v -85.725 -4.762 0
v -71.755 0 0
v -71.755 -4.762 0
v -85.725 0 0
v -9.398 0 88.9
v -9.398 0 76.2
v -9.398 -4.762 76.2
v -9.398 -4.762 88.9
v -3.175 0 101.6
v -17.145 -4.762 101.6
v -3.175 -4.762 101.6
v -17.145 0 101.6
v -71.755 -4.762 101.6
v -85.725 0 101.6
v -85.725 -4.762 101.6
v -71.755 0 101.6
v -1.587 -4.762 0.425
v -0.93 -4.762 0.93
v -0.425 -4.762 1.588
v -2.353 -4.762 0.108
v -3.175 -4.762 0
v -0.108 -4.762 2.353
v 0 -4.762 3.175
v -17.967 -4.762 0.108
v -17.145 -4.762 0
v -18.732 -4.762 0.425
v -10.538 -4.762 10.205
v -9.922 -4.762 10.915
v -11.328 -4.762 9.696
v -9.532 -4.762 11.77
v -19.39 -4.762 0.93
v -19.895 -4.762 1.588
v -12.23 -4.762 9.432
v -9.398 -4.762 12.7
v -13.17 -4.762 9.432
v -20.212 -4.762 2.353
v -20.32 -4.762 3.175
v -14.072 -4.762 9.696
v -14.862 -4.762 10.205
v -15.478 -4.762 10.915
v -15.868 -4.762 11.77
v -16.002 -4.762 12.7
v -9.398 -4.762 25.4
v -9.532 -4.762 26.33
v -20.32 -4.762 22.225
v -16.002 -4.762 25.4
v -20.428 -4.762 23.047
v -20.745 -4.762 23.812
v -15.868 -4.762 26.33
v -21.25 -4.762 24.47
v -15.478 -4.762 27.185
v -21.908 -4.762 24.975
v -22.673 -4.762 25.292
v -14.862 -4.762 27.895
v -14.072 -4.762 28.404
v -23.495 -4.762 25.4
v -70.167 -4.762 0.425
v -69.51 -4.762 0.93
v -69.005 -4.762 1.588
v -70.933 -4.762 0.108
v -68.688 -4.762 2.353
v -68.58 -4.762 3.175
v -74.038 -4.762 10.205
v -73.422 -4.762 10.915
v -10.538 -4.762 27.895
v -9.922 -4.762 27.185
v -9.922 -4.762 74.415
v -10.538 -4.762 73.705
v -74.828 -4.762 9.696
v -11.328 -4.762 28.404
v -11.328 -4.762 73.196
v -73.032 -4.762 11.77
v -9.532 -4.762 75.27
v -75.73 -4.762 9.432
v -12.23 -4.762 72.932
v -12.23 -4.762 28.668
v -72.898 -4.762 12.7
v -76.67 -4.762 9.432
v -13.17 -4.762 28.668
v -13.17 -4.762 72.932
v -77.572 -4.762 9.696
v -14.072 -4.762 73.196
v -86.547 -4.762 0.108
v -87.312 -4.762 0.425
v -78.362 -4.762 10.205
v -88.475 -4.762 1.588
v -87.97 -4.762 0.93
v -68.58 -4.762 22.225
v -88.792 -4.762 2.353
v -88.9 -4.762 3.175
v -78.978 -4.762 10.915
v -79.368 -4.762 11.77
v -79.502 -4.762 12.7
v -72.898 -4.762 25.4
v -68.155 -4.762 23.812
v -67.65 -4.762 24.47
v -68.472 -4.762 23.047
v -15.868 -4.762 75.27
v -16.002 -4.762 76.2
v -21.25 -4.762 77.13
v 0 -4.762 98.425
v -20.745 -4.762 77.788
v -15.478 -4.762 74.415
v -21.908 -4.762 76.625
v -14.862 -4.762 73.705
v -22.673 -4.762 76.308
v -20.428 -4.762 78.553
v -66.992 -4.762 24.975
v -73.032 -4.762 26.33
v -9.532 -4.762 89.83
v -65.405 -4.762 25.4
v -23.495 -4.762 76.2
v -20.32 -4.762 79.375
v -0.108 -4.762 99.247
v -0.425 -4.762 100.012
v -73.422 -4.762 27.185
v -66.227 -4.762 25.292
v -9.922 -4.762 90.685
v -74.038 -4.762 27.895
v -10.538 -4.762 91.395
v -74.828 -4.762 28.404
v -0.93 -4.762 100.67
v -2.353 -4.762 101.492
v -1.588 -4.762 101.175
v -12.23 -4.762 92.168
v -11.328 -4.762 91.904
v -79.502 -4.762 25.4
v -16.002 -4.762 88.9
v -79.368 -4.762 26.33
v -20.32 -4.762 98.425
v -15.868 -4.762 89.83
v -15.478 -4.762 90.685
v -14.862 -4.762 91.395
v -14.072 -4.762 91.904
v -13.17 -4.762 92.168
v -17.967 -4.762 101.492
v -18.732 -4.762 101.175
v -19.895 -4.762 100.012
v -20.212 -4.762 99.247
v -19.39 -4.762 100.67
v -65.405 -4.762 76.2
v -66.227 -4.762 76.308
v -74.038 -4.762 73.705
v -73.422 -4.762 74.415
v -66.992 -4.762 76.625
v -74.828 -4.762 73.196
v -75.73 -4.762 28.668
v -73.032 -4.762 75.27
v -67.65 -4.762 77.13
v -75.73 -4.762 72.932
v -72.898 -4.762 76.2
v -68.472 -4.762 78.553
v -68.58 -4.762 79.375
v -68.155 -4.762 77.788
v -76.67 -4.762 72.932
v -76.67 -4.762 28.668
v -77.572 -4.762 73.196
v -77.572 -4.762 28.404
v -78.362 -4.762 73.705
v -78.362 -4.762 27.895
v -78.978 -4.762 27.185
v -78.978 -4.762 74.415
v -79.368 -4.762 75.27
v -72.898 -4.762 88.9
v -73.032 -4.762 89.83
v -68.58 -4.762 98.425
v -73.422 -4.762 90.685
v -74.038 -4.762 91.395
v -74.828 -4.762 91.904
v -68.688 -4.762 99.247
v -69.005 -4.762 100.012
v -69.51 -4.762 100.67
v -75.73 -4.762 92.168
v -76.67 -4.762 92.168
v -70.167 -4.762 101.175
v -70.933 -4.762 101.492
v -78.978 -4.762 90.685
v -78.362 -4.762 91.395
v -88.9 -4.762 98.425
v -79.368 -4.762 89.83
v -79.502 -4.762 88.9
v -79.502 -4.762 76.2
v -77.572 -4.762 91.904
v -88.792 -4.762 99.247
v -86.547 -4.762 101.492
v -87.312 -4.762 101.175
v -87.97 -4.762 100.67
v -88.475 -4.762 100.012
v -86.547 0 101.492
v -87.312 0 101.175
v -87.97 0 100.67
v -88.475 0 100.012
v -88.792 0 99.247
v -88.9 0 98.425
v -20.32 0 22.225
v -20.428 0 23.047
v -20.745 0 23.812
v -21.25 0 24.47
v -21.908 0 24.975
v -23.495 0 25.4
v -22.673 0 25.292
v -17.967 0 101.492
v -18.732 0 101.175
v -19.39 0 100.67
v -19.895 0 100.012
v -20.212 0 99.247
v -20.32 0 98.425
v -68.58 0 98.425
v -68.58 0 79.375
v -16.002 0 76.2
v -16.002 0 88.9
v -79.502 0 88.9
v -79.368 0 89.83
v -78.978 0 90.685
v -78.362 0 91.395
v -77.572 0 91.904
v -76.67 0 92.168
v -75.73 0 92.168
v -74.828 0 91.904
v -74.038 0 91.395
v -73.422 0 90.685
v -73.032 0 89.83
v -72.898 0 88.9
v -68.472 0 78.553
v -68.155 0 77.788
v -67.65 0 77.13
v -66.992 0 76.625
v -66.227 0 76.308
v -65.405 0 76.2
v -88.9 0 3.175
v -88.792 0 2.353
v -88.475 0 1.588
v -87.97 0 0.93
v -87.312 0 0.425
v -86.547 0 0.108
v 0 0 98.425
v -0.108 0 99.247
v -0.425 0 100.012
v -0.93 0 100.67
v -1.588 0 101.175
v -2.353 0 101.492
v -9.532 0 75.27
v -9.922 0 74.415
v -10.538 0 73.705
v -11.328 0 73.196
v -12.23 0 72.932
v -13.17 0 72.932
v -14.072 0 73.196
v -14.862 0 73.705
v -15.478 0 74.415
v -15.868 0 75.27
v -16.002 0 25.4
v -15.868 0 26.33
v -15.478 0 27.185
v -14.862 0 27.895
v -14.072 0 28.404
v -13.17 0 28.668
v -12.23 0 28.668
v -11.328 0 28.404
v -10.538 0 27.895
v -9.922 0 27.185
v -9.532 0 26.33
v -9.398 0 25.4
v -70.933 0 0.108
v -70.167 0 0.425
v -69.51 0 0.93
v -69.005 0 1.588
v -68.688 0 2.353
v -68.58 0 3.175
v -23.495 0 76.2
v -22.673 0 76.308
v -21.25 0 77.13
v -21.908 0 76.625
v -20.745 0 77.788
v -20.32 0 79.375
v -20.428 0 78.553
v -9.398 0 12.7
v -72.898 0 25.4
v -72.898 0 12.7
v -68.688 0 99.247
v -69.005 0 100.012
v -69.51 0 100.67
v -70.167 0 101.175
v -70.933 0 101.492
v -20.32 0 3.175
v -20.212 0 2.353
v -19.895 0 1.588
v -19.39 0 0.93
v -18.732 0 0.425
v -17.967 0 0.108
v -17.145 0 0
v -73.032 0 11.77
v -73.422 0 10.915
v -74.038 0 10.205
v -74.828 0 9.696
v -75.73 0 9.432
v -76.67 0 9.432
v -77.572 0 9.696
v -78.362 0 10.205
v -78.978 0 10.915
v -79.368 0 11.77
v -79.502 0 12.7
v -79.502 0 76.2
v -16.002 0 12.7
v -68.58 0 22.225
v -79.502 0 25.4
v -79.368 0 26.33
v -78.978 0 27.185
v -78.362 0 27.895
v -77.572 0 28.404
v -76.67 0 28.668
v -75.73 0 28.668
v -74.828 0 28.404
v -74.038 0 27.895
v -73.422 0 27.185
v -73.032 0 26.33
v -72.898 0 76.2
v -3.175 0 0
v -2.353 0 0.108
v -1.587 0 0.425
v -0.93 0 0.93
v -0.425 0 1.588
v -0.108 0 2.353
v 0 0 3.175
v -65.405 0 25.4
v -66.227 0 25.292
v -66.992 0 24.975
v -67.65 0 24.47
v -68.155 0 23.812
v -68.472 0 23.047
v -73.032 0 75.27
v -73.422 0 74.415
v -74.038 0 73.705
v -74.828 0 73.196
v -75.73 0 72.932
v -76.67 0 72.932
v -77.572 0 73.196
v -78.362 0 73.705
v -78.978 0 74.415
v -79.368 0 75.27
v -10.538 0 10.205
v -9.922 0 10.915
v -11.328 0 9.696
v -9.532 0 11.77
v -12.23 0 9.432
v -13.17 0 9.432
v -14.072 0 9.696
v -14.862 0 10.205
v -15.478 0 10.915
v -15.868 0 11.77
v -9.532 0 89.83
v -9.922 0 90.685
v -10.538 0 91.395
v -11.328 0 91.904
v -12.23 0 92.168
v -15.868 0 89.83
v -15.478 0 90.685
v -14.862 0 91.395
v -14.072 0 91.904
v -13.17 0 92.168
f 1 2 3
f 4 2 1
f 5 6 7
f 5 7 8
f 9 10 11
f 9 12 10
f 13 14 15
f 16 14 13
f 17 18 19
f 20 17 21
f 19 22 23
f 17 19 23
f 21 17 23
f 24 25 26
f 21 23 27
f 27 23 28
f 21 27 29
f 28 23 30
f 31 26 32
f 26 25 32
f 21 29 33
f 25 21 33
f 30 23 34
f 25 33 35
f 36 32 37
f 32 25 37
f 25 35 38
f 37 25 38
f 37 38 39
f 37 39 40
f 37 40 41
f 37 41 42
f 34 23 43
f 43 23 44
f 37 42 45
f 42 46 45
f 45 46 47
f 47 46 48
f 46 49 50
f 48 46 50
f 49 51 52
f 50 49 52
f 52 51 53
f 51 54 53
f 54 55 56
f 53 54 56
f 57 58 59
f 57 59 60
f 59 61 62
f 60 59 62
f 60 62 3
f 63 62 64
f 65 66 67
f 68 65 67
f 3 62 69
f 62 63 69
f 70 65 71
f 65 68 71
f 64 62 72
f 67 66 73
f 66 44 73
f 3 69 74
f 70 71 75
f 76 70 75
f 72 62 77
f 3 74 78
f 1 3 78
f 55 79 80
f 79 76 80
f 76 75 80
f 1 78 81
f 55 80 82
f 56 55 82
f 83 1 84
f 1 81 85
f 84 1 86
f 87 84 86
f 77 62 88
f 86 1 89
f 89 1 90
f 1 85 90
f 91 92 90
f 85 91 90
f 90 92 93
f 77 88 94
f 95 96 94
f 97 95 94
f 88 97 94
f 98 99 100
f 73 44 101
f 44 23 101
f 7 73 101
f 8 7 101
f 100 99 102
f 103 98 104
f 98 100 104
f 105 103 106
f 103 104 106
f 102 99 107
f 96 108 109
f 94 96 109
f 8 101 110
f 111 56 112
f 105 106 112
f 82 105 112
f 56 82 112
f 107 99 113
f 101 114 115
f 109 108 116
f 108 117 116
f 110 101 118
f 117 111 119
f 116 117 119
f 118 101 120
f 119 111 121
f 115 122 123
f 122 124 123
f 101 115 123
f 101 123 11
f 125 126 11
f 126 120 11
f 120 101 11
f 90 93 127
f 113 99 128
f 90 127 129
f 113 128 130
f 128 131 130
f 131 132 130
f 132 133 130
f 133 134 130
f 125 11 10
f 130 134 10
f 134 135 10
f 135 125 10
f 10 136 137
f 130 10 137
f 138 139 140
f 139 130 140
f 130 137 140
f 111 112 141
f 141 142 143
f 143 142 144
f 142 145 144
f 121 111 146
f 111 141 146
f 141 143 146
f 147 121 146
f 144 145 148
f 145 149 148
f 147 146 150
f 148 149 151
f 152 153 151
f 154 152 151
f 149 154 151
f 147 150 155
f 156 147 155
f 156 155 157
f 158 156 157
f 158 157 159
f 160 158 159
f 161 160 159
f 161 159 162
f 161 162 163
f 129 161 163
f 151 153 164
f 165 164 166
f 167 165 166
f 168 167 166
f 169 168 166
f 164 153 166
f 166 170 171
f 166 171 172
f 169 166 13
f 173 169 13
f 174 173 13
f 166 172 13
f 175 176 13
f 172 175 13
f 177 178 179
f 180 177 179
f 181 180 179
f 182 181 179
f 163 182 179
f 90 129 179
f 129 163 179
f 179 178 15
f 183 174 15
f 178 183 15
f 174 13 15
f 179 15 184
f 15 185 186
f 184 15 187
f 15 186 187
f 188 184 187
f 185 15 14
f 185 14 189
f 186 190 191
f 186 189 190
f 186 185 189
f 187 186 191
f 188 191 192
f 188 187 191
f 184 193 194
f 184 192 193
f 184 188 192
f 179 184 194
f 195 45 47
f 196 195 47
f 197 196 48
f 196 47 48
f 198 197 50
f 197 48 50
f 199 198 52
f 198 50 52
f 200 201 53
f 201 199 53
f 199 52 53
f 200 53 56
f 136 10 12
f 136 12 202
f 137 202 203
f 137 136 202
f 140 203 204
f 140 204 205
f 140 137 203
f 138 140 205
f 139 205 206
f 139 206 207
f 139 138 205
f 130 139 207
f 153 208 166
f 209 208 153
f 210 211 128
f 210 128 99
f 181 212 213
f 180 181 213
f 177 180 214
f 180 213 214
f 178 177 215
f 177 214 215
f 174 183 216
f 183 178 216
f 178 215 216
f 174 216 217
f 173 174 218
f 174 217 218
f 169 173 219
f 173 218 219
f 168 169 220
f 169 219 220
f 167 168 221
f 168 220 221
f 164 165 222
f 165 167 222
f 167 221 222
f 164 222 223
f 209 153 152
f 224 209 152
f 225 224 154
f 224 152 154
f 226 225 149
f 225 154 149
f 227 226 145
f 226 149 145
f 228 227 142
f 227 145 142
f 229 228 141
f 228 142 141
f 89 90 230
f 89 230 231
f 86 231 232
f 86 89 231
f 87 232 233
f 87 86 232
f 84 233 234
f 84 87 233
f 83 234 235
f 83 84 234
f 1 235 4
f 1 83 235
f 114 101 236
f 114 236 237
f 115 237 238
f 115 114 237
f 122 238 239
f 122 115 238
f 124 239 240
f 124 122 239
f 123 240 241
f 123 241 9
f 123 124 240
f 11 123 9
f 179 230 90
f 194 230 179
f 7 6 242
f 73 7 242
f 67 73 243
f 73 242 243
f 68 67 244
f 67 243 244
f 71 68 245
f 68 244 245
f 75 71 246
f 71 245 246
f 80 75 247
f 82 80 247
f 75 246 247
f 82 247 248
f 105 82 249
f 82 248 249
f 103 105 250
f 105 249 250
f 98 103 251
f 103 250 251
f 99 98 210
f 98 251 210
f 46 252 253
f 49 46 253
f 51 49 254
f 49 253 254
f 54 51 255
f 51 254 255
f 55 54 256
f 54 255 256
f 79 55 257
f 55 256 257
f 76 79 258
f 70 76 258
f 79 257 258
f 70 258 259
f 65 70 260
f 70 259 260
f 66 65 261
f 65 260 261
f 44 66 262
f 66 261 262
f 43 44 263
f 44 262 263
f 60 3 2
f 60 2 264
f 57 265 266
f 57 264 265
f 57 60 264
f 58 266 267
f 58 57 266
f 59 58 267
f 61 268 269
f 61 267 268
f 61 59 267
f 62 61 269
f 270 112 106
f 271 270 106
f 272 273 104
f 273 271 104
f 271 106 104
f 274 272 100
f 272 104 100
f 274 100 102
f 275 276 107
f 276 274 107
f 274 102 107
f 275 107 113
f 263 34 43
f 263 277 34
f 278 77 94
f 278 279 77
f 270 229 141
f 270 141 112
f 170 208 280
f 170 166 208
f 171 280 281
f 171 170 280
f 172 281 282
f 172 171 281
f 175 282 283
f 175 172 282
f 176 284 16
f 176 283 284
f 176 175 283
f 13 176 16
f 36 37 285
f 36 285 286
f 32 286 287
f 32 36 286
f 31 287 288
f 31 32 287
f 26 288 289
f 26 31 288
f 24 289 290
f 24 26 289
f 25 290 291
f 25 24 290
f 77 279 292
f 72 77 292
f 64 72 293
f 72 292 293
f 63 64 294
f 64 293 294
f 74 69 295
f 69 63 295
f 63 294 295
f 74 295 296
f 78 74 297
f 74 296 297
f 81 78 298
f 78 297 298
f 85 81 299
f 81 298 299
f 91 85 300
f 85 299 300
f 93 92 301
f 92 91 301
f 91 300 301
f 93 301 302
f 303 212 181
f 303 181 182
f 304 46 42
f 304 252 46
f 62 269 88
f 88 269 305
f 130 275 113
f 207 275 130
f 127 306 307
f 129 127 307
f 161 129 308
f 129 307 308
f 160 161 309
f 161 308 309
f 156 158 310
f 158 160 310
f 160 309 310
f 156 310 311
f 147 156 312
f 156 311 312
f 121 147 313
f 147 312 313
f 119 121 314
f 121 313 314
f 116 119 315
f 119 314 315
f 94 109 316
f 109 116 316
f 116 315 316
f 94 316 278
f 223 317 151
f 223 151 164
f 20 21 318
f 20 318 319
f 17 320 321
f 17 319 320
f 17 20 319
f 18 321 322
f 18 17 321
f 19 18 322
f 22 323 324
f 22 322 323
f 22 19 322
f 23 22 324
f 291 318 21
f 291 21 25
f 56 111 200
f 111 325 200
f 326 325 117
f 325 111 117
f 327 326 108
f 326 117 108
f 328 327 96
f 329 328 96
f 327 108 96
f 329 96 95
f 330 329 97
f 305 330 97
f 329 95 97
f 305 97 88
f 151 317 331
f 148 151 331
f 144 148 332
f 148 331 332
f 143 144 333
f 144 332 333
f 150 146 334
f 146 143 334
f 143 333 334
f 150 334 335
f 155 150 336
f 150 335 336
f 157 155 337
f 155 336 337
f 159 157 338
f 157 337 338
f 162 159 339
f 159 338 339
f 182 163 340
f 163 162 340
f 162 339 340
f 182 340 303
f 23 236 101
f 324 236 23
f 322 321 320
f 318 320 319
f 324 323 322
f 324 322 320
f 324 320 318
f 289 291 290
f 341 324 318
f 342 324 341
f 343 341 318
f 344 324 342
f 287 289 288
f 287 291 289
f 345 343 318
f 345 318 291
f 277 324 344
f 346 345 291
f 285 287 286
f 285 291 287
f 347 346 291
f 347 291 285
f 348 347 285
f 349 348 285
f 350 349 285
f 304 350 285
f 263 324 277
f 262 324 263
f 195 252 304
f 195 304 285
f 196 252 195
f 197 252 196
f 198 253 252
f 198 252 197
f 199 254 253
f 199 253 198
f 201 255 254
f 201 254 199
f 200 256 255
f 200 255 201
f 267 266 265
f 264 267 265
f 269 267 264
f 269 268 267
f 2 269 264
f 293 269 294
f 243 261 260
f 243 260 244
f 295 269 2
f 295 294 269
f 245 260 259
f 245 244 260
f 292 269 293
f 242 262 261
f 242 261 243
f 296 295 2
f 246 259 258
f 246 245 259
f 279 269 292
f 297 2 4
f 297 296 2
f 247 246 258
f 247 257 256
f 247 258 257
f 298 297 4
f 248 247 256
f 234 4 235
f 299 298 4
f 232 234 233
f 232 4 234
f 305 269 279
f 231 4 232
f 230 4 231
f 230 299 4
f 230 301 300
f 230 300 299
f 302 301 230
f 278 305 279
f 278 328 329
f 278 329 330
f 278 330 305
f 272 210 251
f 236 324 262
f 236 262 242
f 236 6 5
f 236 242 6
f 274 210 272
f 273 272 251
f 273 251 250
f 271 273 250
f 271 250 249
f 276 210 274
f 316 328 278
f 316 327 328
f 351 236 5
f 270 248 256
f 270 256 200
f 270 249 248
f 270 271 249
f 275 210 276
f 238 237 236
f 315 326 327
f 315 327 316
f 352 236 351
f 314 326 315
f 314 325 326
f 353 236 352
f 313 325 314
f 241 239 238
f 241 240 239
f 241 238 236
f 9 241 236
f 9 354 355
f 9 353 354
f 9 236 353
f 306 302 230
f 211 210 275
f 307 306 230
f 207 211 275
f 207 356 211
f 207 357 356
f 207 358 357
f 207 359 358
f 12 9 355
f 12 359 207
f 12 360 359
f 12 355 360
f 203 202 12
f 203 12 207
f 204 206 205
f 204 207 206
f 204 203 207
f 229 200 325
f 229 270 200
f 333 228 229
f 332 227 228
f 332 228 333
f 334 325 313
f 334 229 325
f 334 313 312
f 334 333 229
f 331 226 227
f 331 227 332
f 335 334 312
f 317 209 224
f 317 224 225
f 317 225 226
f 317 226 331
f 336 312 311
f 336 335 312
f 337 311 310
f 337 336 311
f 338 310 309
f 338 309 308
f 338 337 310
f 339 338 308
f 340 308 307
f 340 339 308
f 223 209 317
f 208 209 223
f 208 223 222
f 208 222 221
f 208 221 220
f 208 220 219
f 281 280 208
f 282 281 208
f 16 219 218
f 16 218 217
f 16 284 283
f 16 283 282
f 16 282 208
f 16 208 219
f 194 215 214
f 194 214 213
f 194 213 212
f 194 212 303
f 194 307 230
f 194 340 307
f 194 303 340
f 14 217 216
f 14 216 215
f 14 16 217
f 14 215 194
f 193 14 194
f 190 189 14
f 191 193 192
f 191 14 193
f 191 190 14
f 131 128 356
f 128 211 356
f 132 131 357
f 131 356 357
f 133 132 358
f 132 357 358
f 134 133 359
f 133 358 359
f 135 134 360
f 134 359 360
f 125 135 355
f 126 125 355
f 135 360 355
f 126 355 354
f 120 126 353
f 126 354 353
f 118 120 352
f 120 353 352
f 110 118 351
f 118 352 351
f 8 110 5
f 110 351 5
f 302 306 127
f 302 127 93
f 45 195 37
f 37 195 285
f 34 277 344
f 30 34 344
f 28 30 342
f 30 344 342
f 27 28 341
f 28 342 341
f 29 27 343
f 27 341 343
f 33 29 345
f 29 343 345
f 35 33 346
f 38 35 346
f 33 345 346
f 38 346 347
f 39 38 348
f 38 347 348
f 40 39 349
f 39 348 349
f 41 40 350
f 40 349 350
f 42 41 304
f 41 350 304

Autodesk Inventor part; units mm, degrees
ref_plane "YZ Plane" through (0, 0, 0) normal (1, 0, 0) x (0, 1, 0)
ref_plane "XZ Plane" through (0, 0, 0) normal (0, 1, 0) x (-1, 0, 0)
ref_plane "XY Plane" through (0, 0, 0) normal (0, 0, 1) x (1, 0, 0)
sketch "Sketch1" plane through (0, 0, 0) normal (0, 1, 0) x (-1, 0, 0)
  line L0 (0, 0) -> (20.32, 0)
  line L1 (0, 101.6) -> (0, 0)
  line L2 (44.45, 76.2) -> (20.32, 76.2)
  line L3 (20.32, 76.2) -> (20.32, 101.6)
  line L4 (44.45, 76.2) -> (44.45, 25.4)
  line L5 (20.32, 101.6) -> (0, 101.6)
  line L6 (16.002, 88.9) -> (16.002, 76.2)
  line L7 (9.398, 76.2) -> (9.398, 88.9)
  arc A0 (16.002, 88.9) -> (9.398, 88.9) centre (12.7, 88.9) ccw
  arc A1 (9.398, 76.2) -> (16.002, 76.2) centre (12.7, 76.2) ccw
  line L8 (16.002, 25.4) -> (16.002, 12.7)
  line L9 (9.398, 12.7) -> (9.398, 25.4)
  arc A2 (16.002, 25.4) -> (9.398, 25.4) centre (12.7, 25.4) ccw
  arc A3 (9.398, 12.7) -> (16.002, 12.7) centre (12.7, 12.7) ccw
  line L10 (44.45, 25.4) -> (20.32, 25.4)
  line L11 (20.32, 25.4) -> (20.32, 0)
  dimension "d1" = 101.6
  dimension "d8" = 44.45
  dimension "d11" = 6.604
  dimension "d14" = 12.7
  dimension "d15" = 12.7
  dimension "d18" = 12.7
  dimension "d19" = 20.32
  dimension "d21" = 31.75
  dimension "d23" = 50.8
  dimension "d24" = 25.4
  dimension "d25" = 63.5
  dimension "d26" = 6.604
extrude "Extrusion1" add sketch "Sketch1" against normal blind 4.7625
fillet "Fillet1" radius 3.175 6 edges at (-20.32, -2.3813, 76.2) (-20.32, -2.3813, 101.6) (0, -2.3813, 101.6) (0, -2.3813, 0) (-20.32, -2.3813, 0) (-20.32, -2.3813, 25.4)
mirror "Mirror2" about plane through (-44.45, 0, 76.2) normal (-1, 0, 0)
equation "\"d26\" = d11"
properties part number "torchMount_back"
